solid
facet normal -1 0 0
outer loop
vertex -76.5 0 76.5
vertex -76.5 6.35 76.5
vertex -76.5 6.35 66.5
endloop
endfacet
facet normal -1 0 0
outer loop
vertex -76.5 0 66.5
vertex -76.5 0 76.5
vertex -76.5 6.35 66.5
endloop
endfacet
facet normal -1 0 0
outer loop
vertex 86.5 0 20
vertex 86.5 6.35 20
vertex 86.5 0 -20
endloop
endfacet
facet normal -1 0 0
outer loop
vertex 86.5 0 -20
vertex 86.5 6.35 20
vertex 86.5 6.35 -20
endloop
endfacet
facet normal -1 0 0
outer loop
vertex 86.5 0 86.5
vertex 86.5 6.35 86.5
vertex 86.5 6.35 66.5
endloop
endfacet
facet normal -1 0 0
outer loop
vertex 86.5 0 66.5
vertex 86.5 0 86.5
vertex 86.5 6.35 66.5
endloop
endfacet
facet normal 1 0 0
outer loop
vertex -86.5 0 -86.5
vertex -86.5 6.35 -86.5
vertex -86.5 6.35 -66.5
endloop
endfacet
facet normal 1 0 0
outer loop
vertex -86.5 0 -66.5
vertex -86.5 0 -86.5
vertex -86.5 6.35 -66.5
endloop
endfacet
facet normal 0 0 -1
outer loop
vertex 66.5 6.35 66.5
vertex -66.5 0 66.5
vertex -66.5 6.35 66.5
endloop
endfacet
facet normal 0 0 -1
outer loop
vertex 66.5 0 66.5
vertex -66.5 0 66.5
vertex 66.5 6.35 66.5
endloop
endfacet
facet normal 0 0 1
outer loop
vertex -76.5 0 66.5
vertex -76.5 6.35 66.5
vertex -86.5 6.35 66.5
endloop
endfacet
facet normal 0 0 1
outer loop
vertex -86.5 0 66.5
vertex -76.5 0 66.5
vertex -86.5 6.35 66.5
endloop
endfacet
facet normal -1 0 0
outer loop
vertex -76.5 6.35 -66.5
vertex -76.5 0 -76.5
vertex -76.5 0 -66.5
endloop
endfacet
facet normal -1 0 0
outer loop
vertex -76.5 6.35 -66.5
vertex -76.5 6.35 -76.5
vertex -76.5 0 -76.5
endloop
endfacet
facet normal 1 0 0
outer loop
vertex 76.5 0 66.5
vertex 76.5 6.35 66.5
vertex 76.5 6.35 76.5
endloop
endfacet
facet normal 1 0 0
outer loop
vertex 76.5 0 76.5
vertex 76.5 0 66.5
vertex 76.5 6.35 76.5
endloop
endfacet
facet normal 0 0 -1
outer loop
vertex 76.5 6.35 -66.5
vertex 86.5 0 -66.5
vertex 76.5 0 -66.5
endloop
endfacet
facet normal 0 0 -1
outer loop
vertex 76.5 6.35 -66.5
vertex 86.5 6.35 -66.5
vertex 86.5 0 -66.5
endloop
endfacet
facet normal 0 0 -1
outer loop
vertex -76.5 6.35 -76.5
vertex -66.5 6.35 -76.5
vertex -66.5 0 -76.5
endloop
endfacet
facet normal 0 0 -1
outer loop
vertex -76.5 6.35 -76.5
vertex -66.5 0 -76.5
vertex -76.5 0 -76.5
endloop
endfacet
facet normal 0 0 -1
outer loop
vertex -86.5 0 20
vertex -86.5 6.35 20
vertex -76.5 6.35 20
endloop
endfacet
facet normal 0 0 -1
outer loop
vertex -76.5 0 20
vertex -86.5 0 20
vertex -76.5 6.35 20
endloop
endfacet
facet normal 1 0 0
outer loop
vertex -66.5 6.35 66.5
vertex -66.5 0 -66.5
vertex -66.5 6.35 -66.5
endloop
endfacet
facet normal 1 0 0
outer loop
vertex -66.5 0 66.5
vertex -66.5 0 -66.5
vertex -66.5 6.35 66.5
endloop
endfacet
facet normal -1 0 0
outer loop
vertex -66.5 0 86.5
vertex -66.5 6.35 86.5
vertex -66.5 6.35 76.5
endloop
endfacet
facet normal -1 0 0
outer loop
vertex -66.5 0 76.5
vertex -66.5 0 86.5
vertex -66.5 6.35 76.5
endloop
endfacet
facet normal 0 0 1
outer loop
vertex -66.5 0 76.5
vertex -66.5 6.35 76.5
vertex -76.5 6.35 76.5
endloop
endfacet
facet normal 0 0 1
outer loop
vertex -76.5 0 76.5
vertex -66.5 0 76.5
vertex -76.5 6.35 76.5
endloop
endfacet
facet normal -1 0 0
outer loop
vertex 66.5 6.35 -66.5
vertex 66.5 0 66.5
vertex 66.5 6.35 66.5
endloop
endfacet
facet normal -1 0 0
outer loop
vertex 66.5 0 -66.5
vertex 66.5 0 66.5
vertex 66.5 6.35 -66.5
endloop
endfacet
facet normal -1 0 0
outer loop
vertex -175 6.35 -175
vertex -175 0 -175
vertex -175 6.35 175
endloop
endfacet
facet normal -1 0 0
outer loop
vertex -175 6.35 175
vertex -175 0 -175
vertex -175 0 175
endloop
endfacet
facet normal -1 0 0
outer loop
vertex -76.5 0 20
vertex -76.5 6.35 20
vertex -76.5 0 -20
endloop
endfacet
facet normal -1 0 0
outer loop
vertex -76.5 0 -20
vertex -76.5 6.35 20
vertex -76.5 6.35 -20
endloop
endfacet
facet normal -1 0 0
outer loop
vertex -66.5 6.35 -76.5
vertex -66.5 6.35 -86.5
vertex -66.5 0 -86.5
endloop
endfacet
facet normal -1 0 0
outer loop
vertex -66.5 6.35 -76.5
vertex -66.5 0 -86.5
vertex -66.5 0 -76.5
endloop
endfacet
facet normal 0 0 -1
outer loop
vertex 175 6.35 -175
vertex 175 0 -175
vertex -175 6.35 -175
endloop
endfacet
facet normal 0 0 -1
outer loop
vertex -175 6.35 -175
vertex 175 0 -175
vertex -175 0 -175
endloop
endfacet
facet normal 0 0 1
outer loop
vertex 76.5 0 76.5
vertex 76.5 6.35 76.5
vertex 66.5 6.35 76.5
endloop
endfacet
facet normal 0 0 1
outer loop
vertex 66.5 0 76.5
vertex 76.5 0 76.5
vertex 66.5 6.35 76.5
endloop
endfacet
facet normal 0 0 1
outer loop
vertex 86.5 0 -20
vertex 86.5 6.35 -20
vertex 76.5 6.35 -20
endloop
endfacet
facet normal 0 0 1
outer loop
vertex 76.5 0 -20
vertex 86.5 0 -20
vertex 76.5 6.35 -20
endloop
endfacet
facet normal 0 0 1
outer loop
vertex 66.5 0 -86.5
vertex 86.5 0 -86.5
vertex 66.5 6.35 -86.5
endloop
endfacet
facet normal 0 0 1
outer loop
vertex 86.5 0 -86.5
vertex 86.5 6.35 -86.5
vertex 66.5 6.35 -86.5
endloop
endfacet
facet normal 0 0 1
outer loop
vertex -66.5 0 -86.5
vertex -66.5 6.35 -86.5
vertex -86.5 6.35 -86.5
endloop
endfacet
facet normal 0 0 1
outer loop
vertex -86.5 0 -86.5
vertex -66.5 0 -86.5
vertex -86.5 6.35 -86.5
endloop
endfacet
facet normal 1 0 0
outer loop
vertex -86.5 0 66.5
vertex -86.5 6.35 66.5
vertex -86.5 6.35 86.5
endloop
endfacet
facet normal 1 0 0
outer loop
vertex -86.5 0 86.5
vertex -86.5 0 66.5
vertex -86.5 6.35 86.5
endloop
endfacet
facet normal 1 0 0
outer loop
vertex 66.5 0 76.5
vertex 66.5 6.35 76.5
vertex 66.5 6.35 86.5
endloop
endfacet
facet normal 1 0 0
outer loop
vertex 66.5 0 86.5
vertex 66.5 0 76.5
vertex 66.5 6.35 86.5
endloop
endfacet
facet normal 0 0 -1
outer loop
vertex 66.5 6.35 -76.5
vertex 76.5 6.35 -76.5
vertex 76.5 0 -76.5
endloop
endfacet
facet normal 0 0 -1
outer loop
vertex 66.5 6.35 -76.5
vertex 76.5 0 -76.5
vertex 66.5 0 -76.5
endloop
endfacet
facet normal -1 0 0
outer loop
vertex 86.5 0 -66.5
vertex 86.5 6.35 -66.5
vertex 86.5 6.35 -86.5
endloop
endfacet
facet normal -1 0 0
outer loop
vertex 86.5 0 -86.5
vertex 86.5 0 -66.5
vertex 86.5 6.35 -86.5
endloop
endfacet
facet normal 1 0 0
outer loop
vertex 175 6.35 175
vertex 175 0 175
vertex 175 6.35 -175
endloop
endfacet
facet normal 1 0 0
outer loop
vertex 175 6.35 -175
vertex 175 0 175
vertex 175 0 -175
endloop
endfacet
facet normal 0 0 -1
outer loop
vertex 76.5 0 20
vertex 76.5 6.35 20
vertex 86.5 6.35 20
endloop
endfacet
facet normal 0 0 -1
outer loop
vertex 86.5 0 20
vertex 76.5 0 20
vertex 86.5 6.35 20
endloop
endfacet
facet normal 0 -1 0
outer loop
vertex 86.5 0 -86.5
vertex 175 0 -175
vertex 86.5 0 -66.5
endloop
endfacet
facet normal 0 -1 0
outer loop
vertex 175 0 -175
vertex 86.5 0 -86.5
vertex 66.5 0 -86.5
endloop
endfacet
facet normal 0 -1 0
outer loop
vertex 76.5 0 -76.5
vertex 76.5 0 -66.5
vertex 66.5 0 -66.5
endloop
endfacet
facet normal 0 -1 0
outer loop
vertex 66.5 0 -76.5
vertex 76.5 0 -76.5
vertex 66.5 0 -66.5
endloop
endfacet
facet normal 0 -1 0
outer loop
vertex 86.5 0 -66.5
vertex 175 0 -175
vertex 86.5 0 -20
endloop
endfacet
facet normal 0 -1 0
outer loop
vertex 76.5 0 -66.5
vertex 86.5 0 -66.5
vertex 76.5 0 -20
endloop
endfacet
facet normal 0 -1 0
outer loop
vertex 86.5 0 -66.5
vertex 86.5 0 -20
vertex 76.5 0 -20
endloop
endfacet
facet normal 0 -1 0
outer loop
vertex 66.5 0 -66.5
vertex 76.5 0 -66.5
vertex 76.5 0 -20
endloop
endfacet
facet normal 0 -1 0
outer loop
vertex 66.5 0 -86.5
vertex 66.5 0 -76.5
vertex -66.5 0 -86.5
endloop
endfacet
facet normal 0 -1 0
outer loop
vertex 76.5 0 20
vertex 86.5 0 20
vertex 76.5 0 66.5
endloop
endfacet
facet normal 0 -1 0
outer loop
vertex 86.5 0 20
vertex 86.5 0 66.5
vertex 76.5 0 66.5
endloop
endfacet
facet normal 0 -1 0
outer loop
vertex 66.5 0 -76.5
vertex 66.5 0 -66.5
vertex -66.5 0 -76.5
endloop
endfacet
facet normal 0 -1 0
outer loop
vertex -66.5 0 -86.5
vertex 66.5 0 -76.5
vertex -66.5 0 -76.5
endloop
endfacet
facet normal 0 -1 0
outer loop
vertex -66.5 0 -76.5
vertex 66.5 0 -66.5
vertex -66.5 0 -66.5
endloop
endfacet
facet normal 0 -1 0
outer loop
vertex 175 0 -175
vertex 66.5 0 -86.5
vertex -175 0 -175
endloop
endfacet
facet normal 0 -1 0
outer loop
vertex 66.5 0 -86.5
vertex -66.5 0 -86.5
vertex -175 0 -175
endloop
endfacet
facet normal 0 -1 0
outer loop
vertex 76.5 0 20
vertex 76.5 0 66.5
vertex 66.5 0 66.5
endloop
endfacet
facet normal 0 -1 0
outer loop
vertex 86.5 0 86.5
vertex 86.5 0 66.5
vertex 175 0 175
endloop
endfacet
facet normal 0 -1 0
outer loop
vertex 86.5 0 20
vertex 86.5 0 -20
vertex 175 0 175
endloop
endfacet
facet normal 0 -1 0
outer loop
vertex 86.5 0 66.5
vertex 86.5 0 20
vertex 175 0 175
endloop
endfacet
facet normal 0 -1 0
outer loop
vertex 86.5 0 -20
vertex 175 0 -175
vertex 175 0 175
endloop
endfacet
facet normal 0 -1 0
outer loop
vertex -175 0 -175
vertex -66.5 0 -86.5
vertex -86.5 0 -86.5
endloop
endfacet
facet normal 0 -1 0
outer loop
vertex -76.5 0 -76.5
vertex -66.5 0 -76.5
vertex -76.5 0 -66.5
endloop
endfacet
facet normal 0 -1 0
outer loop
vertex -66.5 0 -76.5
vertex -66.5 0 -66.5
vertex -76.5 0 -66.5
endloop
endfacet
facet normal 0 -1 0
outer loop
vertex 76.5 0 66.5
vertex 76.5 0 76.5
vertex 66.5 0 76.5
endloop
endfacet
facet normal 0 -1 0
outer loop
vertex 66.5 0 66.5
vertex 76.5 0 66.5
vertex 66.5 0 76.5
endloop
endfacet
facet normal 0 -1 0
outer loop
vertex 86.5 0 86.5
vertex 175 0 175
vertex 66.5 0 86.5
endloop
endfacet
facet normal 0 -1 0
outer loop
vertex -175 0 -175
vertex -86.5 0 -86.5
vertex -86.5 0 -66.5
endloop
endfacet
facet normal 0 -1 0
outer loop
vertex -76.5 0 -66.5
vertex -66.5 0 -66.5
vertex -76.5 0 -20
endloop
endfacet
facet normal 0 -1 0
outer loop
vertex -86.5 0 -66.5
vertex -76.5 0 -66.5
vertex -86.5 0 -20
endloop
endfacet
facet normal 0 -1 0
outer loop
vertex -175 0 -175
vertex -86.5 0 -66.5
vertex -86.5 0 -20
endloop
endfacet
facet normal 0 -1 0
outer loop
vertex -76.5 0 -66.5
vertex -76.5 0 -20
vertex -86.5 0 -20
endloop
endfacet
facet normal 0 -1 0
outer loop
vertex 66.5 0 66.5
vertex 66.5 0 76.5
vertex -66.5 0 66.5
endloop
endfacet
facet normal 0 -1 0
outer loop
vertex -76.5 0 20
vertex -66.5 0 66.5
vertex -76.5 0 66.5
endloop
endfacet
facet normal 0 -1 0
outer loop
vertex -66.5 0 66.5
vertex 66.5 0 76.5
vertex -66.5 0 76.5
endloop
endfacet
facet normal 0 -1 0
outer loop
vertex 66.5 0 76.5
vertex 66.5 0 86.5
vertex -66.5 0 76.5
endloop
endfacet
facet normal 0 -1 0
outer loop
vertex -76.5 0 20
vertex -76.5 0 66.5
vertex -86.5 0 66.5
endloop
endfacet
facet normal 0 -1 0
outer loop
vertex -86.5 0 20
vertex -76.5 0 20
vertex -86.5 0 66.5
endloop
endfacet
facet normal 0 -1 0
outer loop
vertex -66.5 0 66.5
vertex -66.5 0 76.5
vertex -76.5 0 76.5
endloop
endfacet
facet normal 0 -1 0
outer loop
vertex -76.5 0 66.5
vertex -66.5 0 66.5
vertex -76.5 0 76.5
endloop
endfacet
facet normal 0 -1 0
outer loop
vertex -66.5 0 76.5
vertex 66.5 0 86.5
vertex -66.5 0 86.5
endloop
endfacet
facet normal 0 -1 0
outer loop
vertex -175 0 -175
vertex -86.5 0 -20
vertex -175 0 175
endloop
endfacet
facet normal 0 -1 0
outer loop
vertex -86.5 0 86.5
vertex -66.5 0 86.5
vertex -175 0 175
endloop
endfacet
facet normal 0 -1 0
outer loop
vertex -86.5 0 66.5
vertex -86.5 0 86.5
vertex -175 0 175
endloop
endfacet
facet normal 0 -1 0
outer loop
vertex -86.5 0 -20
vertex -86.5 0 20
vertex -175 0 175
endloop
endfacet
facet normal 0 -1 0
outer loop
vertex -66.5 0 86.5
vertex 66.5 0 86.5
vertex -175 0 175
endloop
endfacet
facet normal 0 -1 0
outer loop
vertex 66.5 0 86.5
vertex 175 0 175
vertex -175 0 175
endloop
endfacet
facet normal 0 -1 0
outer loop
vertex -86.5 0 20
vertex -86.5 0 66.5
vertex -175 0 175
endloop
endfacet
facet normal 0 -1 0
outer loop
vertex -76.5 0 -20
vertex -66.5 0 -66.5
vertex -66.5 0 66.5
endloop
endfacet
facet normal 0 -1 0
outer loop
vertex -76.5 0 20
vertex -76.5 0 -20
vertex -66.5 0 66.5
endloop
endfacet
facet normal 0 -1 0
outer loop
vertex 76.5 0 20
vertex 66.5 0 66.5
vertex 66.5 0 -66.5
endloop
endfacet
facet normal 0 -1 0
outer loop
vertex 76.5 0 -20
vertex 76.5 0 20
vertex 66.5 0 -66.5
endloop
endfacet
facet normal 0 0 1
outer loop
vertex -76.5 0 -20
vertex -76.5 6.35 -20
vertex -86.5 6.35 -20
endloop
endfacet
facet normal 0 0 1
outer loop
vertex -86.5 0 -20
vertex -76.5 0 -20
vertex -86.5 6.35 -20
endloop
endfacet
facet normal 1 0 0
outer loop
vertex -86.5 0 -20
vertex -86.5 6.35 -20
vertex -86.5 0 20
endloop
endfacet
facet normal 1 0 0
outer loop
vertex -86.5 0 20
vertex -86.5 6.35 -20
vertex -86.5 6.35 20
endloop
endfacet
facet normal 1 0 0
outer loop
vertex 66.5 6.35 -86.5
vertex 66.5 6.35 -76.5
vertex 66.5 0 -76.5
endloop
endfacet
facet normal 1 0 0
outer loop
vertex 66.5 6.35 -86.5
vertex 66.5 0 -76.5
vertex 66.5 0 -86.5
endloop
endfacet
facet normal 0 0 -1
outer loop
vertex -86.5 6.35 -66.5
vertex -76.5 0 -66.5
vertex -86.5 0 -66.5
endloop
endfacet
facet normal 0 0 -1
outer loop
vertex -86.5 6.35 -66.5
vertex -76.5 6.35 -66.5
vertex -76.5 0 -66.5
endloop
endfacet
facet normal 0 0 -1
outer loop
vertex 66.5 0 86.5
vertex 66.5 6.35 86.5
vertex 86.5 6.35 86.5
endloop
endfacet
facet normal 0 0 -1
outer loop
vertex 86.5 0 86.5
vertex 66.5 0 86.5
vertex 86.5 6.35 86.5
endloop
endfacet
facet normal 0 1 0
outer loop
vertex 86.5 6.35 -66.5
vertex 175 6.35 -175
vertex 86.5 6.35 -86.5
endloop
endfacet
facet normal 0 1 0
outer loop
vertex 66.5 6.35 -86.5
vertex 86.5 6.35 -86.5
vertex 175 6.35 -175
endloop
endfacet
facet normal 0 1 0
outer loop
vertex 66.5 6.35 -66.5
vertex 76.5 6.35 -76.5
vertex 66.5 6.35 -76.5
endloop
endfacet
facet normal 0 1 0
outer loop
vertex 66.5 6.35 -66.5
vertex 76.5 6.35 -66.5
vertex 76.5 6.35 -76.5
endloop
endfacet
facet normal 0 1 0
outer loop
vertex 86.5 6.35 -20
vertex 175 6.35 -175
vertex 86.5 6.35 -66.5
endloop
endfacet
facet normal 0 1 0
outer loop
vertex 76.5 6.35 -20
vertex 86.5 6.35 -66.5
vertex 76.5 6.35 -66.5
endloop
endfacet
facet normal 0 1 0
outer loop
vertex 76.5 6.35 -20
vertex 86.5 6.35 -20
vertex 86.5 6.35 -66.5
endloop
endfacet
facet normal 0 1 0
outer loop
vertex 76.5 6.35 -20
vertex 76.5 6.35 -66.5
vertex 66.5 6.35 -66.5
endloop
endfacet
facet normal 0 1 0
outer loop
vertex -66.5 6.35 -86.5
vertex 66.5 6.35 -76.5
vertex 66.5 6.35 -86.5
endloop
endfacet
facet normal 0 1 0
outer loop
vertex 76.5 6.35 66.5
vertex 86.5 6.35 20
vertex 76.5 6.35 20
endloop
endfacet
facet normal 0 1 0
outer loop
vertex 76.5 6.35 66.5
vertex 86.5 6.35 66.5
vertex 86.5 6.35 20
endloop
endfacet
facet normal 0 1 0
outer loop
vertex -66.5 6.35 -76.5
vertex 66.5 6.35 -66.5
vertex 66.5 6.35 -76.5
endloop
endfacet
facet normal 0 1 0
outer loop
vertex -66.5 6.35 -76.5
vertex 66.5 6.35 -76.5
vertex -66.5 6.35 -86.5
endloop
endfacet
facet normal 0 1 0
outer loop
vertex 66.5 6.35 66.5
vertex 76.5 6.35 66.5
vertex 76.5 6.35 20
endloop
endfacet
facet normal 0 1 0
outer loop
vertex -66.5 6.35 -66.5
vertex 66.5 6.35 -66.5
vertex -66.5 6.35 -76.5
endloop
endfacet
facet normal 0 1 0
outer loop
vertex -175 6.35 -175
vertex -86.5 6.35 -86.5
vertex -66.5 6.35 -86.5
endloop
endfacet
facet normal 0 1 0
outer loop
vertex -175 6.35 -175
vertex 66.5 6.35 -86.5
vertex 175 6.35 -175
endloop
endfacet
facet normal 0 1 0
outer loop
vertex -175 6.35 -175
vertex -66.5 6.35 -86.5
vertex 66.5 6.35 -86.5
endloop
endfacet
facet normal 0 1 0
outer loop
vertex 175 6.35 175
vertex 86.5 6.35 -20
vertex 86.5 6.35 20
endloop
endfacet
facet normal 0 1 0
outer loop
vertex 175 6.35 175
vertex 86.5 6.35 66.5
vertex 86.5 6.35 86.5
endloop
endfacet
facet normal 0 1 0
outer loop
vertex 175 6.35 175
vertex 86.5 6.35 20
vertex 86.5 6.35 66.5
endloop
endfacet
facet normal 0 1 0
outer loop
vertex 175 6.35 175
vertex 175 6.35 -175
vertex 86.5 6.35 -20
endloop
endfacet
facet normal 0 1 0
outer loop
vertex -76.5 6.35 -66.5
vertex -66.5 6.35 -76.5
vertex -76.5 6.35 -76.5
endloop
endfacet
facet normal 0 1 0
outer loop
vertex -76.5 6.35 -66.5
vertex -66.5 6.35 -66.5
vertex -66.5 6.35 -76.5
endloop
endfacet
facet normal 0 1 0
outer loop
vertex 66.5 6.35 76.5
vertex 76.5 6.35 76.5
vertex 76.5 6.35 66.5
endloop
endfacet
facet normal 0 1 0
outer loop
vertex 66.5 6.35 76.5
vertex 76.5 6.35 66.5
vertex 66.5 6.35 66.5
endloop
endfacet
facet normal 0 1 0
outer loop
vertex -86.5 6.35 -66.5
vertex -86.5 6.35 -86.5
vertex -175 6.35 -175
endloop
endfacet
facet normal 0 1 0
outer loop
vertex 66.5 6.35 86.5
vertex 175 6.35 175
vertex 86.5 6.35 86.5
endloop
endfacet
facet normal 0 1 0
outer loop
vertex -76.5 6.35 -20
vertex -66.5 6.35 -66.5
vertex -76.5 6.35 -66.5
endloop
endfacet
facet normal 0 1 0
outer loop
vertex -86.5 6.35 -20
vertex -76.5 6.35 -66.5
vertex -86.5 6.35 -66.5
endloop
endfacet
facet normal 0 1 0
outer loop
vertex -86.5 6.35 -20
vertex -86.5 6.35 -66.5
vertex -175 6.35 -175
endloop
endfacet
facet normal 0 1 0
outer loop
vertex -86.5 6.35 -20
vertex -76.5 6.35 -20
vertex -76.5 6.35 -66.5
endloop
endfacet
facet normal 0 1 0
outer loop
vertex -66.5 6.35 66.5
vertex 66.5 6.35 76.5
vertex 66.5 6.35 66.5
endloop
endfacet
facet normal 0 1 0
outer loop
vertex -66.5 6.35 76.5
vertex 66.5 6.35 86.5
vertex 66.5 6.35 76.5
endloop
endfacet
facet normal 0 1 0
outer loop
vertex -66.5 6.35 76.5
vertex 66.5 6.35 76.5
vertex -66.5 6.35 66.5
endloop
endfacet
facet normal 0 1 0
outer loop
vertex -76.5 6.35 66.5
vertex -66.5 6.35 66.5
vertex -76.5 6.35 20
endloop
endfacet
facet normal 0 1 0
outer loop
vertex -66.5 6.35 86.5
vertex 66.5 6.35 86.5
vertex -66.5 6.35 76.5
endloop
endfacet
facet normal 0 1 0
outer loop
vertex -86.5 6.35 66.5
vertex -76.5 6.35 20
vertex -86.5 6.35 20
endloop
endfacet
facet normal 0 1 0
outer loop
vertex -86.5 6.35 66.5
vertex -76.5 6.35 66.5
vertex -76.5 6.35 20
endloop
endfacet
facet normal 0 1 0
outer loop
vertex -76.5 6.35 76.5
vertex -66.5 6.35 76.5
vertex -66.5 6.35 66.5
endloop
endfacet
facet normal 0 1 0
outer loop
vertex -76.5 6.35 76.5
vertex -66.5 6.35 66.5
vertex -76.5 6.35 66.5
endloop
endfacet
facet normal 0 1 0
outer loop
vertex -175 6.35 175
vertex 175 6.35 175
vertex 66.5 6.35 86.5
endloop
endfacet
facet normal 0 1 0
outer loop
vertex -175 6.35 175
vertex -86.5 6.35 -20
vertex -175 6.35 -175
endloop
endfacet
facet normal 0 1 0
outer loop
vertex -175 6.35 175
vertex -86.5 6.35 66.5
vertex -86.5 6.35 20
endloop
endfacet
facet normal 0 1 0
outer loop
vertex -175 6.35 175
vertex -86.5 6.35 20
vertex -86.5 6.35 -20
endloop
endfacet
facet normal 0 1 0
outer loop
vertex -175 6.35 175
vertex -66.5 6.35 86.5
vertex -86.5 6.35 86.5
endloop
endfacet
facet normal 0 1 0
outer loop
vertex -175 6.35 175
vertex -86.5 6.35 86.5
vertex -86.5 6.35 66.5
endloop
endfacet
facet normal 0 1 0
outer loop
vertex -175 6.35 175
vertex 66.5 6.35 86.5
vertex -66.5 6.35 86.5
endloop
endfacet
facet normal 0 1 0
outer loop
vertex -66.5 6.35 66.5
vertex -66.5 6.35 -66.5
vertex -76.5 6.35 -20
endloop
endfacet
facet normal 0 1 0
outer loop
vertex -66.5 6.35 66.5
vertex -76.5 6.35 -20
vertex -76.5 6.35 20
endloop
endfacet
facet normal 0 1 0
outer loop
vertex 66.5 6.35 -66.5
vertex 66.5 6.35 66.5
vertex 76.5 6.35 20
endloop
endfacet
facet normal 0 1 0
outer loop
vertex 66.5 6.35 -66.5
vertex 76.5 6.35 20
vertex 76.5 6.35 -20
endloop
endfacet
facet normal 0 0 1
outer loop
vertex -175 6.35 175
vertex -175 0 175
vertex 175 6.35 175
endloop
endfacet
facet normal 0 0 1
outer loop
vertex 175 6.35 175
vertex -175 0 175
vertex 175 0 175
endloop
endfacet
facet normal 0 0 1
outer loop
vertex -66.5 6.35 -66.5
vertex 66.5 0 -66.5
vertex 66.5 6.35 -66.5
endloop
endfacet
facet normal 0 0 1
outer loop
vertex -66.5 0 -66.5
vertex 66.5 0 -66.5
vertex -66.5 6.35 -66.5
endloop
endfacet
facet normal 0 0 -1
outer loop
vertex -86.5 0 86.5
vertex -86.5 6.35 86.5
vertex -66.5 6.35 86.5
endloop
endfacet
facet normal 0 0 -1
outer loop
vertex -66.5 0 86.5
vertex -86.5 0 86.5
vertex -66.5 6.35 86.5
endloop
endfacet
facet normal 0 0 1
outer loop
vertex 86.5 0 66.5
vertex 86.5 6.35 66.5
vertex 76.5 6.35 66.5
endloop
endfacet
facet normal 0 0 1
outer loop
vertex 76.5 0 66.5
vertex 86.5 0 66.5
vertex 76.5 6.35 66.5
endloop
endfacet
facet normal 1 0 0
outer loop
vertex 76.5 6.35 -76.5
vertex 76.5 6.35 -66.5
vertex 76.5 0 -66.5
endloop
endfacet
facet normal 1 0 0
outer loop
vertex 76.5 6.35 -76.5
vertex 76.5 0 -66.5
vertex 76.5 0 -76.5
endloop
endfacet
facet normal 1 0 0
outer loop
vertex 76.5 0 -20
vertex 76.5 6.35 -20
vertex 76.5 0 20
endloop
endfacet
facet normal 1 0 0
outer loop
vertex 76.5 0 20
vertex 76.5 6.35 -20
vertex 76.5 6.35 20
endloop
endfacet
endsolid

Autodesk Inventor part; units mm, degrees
ref_plane "YZ Plane" through (0, 0, 0) normal (1, 0, 0) x (0, 1, 0)
ref_plane "XZ Plane" through (0, 0, 0) normal (0, 1, 0) x (-1, 0, 0)
ref_plane "XY Plane" through (0, 0, 0) normal (0, 0, 1) x (1, 0, 0)
sketch "Sketch1" plane through (0, 0, 0) normal (0, 1, 0) x (-1, 0, 0)
  line L0 (-175, 175) -> (-175, -175)
  line L1 (-175, -175) -> (175, -175)
  line L2 (175, -175) -> (175, 175)
  line L3 (175, 175) -> (-175, 175)
  line L4 (-175, 175) -> (175, -175) construction
  line L5 (-175, -175) -> (175, 175) construction
  line L6 (-86.5, 86.5) -> (86.5, 86.5)
  line L7 (86.5, 86.5) -> (86.5, -86.5)
  line L8 (86.5, -86.5) -> (-86.5, -86.5)
  line L9 (-86.5, -86.5) -> (-86.5, 86.5)
  line L10 (-86.5, 86.5) -> (86.5, -86.5) construction
  line L11 (86.5, 86.5) -> (-86.5, -86.5) construction
  line L12 (-66.5, 66.5) -> (-66.5, -66.5)
  line L13 (-66.5, -66.5) -> (66.5, -66.5)
  line L14 (66.5, -66.5) -> (66.5, 66.5)
  line L15 (66.5, 66.5) -> (-66.5, 66.5)
  line L16 (-66.5, 66.5) -> (66.5, -66.5) construction
  line L17 (-66.5, -66.5) -> (66.5, 66.5) construction
  line L18 (86.5, 0) -> (86.5, 20)
  line L19 (0, 233.3952) -> (0, -224.0457) construction
  line L20 (-86.5, -66.5) -> (-76.5, -66.5)
  line L21 (-76.5, -66.5) -> (-76.5, -76.5)
  line L22 (-76.5, -76.5) -> (-66.5, -76.5)
  line L23 (-66.5, -76.5) -> (-66.5, -86.5)
  line L24 (-66.5, 86.5) -> (-86.5, 86.5) construction
  line L25 (-86.5, 86.5) -> (-86.5, 66.5) construction
  line L26 (-86.5, 20) -> (-86.5, -20) construction
  line L27 (-86.5, -66.5) -> (-86.5, -86.5) construction
  line L28 (-86.5, -86.5) -> (-66.5, -86.5) construction
  point P0 (0, 0)
  dimension "d0" = 350
  dimension "d1" = 350
  dimension "d2" = 173
  dimension "d3" = 173
  dimension "d4" = 133
  dimension "d5" = 133
extrude "Extrusion1" add sketch "Sketch1" along normal blind 6.35 contours L3 L2 L1 L0 | L6 L7 L8 L23 L22 L21 L20 L9 | L20 L21 L22 L23 L8 L9
sketch "Sketch2" plane through (0, 6.35, 0) normal (0, 1, 0) x (1, 0, 0)
  line L0 (86.5, -86.5) -> (86.5, 86.5)
  line L1 (86.5, 86.5) -> (-86.5, 86.5)
  line L2 (-86.5, 86.5) -> (-86.5, -86.5)
  line L3 (-86.5, -86.5) -> (86.5, -86.5)
  line L4 (86.5, -86.5) -> (-86.5, 86.5) construction
  line L5 (86.5, 86.5) -> (-86.5, -86.5) construction
  line L6 (-66.5, -86.5) -> (-66.5, -76.5)
  line L7 (-66.5, -76.5) -> (-76.5, -76.5)
  line L8 (-76.5, -76.5) -> (-76.5, -66.5)
  line L9 (-76.5, -66.5) -> (-86.5, -66.5)
  line L10 (-86.5, -66.5) -> (-86.5, -86.5)
  line L11 (-86.5, -86.5) -> (-66.5, -86.5)
  line L12 (-86.5, 0) -> (-86.5, -20)
  line L13 (-86.5, -20) -> (-76.5, -20)
  line L14 (-76.5, -20) -> (-76.5, 20)
  line L15 (-76.5, 20) -> (-86.5, 20)
  line L16 (-86.5, 20) -> (-86.5, 0)
  line L17 (-66.5, 86.5) -> (-66.5, 76.5)
  line L18 (-66.5, 76.5) -> (-76.5, 76.5)
  line L19 (-76.5, 76.5) -> (-76.5, 66.5)
  line L20 (-76.5, 66.5) -> (-86.5, 66.5)
  line L21 (0, -182.5609) -> (0, 182.5037) construction
  line L22 (66.5, -86.5) -> (66.5, -76.5)
  line L23 (66.5, -76.5) -> (76.5, -76.5)
  line L24 (76.5, -76.5) -> (76.5, -66.5)
  line L25 (76.5, -66.5) -> (86.5, -66.5)
  line L26 (86.5, -20) -> (76.5, -20)
  line L27 (76.5, -20) -> (76.5, 20)
  line L28 (76.5, 20) -> (86.5, 20)
  line L29 (66.5, 86.5) -> (66.5, 76.5)
  line L30 (66.5, 76.5) -> (76.5, 76.5)
  line L31 (76.5, 76.5) -> (76.5, 66.5)
  line L32 (76.5, 66.5) -> (86.5, 66.5)
  point P0 (0, 0)
  dimension "d17" = 173
  dimension "d18" = 173
  dimension "d19" = 10
  dimension "d20" = 10
  dimension "d21" = 10
  dimension "d22" = 20
  dimension "d23" = 10
  dimension "d24" = 40
  dimension "d25" = 10
  dimension "d26" = 10
  dimension "d27" = 10
  dimension "d28" = 10
extrude "Extrusion2" cut sketch "Sketch2" against normal blind 6.35 contours L3 L2 L9 L8 L7 L6 | L2 L15 L14 L13 | L17 L18 L19 L20 L2 L1
ref_plane "Work Plane1" through (0, 0, 175) normal (1, 0, 0) x (0, 0, -1)
mirror "Mirror1" about plane through (0, 0, 175) normal (1, 0, 0) of "Extrusion2"
ref_plane "Work Plane2" through (0, 0, 175) normal (1, 0, 0) x (0, 0, -1)
properties part number "Milestone 2 Main Vehicle Chassis"
